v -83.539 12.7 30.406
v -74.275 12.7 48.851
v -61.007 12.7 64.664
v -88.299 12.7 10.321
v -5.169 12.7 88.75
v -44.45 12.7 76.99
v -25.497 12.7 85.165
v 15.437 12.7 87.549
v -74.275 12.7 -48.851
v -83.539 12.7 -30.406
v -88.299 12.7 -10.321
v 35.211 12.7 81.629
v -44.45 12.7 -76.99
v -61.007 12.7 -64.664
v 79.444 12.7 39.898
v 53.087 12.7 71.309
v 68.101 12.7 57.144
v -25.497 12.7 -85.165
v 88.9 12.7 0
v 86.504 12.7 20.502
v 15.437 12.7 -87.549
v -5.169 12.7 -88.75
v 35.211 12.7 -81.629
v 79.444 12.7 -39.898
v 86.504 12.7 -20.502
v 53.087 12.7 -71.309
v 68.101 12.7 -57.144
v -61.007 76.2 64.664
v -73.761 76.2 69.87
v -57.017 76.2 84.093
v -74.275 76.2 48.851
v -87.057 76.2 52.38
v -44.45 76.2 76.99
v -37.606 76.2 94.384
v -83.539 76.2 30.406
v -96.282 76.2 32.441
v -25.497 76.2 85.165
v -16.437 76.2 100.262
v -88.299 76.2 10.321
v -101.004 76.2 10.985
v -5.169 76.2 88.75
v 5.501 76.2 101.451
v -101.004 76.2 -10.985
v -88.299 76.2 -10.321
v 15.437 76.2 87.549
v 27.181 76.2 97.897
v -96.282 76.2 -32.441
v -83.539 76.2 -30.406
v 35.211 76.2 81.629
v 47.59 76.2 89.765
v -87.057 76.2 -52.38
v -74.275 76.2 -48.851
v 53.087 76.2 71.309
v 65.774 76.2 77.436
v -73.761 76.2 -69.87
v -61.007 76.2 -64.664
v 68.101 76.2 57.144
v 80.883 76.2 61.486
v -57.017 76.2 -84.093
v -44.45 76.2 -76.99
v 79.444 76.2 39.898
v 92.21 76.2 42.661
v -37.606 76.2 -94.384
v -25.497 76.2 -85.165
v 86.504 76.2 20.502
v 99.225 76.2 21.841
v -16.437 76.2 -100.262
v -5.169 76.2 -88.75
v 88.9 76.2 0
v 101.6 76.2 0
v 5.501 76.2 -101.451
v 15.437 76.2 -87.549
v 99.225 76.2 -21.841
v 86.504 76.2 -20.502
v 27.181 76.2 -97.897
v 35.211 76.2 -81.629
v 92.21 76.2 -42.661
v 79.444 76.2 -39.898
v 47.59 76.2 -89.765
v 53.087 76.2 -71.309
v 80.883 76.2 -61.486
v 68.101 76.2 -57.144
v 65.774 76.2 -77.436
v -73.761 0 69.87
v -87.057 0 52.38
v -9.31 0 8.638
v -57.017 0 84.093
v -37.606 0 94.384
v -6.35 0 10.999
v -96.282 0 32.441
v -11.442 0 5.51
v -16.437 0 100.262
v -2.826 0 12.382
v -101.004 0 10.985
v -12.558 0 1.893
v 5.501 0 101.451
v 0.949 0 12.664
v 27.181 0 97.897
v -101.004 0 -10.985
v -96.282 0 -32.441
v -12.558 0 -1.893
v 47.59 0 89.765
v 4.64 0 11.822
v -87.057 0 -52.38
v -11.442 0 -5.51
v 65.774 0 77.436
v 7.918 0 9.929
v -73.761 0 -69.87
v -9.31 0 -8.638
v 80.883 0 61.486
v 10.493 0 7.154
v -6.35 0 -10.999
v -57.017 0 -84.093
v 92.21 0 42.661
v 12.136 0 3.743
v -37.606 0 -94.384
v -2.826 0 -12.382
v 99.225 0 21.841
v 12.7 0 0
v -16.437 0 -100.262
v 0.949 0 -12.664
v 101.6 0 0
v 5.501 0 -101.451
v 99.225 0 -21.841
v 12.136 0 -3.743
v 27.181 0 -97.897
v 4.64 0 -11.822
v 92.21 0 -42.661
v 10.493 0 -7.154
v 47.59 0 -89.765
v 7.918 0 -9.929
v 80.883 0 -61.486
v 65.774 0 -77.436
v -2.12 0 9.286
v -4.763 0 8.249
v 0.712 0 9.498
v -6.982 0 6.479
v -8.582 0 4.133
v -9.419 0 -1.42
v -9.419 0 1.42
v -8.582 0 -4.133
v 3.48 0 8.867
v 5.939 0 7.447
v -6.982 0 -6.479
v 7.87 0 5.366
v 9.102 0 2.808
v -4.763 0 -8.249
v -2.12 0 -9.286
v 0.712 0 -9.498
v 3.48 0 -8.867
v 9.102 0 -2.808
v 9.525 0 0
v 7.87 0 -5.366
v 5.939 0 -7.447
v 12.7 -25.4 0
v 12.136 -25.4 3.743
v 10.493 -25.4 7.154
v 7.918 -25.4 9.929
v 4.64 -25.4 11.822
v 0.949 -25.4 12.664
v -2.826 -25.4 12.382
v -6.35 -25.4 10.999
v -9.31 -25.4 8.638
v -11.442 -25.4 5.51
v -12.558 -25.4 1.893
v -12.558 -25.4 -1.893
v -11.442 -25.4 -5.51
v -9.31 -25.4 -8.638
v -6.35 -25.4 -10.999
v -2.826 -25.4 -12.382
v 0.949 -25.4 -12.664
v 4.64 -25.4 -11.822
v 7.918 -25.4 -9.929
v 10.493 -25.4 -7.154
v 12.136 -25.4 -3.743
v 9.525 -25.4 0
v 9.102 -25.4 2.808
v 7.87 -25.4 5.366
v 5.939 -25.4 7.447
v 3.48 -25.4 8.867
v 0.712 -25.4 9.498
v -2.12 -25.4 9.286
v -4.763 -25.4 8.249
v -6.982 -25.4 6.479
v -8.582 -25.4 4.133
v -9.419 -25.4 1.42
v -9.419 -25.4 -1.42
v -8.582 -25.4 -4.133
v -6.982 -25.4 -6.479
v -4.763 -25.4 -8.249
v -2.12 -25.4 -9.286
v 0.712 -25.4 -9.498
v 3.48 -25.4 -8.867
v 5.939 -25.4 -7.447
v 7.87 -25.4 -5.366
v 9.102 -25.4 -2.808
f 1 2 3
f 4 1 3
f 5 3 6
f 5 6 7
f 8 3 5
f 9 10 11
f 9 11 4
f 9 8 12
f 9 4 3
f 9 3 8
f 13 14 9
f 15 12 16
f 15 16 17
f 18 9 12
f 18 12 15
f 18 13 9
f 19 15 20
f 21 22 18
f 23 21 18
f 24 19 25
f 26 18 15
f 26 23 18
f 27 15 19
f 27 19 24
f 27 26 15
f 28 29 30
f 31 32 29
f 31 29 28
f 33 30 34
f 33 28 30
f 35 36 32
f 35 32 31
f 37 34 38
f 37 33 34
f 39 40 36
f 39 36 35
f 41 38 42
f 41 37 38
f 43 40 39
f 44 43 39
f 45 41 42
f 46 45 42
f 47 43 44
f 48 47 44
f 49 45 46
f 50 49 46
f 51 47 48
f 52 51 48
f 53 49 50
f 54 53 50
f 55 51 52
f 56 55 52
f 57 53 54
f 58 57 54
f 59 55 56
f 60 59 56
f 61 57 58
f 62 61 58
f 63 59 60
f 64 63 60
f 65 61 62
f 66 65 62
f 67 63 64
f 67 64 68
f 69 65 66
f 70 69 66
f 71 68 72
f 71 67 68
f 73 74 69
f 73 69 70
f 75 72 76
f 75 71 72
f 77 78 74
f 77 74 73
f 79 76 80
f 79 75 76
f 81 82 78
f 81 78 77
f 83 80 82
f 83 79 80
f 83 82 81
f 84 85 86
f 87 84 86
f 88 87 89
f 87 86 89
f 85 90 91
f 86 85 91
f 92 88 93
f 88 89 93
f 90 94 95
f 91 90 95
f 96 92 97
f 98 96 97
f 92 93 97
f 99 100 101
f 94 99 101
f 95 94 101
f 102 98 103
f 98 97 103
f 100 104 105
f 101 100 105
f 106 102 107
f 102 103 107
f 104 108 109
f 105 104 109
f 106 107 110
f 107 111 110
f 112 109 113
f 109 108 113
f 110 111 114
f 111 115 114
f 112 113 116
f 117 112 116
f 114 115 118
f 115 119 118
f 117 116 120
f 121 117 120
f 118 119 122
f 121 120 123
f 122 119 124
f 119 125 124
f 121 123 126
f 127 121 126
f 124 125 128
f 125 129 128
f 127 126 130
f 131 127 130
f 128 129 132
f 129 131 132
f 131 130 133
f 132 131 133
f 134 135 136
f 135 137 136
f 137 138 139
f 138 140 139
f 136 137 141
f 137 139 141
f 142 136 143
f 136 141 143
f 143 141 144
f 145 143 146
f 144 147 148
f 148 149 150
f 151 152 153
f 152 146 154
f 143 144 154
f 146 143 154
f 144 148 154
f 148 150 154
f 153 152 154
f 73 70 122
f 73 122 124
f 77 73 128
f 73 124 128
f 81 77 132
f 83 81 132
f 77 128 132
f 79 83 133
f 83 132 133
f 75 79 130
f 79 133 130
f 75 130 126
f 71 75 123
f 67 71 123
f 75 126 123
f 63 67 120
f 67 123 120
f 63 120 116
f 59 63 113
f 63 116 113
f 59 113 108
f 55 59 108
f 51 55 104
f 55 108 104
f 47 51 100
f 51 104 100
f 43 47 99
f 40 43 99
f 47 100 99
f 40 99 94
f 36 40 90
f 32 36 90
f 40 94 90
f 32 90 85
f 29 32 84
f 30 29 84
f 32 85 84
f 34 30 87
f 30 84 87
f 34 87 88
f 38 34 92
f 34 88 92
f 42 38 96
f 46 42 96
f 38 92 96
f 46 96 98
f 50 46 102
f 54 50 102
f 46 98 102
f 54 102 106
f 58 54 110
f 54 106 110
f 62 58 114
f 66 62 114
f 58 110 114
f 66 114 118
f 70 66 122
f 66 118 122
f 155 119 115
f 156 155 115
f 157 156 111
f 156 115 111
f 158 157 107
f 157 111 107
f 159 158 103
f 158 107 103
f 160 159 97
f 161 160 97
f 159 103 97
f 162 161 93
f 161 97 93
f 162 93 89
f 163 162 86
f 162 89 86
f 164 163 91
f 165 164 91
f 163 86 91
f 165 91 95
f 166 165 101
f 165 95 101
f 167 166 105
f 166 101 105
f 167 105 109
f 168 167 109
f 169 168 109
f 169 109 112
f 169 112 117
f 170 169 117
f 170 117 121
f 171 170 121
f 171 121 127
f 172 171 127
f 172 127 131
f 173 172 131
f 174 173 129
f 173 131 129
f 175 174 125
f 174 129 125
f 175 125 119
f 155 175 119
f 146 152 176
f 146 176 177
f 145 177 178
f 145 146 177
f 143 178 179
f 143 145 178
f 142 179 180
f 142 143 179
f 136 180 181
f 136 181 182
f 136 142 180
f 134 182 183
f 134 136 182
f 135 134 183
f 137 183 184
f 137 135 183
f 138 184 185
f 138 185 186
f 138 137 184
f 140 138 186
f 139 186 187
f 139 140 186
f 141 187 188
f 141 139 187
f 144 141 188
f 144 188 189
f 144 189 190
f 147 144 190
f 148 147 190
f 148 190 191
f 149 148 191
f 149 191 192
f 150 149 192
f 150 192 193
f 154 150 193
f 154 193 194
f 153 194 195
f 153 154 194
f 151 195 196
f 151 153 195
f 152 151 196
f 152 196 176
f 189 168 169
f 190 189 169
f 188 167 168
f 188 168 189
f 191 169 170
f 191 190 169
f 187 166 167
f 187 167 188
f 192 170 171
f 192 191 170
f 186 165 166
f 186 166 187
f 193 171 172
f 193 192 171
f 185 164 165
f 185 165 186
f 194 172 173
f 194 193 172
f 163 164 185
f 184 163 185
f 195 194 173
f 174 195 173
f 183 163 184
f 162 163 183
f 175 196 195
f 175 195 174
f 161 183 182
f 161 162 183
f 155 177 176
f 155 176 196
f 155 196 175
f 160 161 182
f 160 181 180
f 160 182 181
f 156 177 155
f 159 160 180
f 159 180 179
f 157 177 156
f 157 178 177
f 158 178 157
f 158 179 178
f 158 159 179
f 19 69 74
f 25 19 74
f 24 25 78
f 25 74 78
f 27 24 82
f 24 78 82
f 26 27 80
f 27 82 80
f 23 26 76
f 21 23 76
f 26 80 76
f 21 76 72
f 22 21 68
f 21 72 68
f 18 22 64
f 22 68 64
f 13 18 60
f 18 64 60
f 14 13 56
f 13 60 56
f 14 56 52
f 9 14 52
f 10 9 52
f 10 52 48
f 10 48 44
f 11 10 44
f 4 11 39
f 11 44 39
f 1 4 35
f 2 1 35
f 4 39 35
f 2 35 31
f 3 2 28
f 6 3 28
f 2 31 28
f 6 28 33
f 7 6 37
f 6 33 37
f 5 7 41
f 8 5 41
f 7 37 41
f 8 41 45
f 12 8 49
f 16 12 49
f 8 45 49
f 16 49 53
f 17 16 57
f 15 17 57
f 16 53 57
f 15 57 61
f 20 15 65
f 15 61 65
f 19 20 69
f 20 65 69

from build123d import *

# Parameters (mm, degrees)
SKETCH1_R           = 101.6
BOSS_EXTRUDE1_DEPTH = 76.2
SKETCH2_R           = 88.9
CUT_EXTRUDE1_DEPTH  = 63.5
SKETCH3_R           = 12.7
SKETCH3_R_2         = 9.525
BOSS_EXTRUDE2_DEPTH = 25.4


with BuildPart() as part:
    # Sketch1 → Boss-Extrude1 (new body)
    with BuildSketch(Plane(origin=(0, 0, 0), x_dir=(1, 0, 0), z_dir=(0, 1, 0))):
        Circle(SKETCH1_R)
    extrude(amount=BOSS_EXTRUDE1_DEPTH)

    # Sketch2 → Cut-Extrude1 (cut)
    with BuildSketch(Plane(origin=(0, 76.2, 0), x_dir=(1, 0, 0), z_dir=(0, 1, 0))):
        Circle(SKETCH2_R)
    extrude(amount=-CUT_EXTRUDE1_DEPTH, mode=Mode.SUBTRACT)

    # Sketch3 → Boss-Extrude2 (add)
    with BuildSketch(Plane.XZ):
        Circle(SKETCH3_R)
        Circle(SKETCH3_R_2, mode=Mode.SUBTRACT)
    extrude(amount=BOSS_EXTRUDE2_DEPTH)


solid = part.part
